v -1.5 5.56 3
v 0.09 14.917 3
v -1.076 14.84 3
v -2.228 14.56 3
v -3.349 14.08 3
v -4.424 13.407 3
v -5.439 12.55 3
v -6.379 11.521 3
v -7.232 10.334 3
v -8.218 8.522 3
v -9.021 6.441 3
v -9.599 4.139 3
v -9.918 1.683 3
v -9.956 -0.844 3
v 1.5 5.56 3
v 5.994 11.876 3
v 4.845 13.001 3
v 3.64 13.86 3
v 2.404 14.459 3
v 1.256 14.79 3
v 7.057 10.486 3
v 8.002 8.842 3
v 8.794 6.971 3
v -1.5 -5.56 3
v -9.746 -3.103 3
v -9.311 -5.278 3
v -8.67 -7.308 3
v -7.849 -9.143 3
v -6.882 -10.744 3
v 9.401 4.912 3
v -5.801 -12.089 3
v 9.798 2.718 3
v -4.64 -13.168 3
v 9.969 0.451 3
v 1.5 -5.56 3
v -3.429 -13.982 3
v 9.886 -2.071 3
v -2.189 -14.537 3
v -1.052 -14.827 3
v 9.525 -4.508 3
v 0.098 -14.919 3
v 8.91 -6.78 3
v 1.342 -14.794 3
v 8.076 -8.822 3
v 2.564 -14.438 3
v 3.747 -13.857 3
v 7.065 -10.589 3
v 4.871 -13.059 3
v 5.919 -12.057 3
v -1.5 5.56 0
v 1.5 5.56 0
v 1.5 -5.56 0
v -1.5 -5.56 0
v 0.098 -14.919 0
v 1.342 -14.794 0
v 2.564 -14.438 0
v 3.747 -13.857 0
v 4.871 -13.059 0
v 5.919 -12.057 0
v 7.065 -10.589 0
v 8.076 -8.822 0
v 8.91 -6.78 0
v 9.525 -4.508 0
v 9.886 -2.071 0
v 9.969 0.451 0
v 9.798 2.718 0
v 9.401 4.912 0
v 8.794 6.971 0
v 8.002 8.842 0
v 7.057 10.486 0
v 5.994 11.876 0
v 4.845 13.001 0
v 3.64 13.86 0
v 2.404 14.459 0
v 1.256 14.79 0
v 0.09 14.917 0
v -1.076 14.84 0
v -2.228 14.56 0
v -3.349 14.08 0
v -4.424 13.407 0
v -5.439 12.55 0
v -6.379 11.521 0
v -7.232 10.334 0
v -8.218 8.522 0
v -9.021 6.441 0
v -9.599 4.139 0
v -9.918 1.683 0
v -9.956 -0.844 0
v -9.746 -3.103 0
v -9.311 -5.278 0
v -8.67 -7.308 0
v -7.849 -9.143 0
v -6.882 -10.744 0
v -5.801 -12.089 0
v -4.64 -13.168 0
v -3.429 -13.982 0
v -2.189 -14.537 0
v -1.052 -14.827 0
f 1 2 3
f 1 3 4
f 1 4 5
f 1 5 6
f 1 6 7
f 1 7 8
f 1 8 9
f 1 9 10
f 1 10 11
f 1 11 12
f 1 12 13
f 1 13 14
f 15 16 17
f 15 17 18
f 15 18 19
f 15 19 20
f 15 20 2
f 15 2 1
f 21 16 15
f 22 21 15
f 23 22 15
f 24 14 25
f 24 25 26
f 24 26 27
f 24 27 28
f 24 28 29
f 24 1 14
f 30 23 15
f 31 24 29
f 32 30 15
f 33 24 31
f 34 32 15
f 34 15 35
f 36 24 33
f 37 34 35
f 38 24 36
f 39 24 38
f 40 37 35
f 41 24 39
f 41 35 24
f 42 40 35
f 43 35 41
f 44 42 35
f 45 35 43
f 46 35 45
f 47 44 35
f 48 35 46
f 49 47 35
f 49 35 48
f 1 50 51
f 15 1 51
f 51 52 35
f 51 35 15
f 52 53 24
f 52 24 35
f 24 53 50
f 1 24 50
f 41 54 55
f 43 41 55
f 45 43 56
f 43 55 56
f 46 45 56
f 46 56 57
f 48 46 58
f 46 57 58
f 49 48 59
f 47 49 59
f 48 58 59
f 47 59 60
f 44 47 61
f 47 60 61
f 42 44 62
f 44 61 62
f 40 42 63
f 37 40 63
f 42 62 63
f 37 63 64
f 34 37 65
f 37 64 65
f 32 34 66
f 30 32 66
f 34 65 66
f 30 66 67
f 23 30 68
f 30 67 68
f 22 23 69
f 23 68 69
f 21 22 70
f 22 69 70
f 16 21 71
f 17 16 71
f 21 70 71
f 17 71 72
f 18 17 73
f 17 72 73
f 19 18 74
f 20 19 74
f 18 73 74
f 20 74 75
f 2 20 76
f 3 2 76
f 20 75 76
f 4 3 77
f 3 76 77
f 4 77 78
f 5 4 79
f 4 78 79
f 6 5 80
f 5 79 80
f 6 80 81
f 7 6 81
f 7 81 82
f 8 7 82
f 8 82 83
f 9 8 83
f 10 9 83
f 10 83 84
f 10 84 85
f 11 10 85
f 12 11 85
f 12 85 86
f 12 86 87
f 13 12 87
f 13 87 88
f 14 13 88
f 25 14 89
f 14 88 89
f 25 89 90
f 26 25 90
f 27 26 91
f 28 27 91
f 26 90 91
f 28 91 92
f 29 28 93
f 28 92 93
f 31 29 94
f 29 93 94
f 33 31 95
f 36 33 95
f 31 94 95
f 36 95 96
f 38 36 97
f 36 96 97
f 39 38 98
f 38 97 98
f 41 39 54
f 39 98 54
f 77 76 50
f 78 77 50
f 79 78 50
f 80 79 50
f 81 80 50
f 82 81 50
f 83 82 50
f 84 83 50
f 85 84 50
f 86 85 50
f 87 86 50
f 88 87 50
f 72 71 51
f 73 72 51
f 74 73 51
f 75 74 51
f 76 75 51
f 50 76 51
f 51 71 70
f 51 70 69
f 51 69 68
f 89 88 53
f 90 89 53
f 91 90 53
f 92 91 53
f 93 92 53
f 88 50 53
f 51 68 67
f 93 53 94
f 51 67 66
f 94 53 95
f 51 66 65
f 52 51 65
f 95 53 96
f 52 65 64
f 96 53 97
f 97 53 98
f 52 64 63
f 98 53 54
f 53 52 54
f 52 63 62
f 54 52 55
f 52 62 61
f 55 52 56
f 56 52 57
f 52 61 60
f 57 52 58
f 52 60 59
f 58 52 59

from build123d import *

# Parameters (mm, degrees)
SKETCH1_RX         = 14.919059527
SKETCH1_RY         = 9.974940077
SKETCH1_W          = 3
SKETCH1_H          = 11.12
BASE_EXTRUDE_DEPTH = 3


with BuildPart() as part:
    # Sketch1 → Base-Extrude (new body)
    with BuildSketch(Plane.XY):
        with Locations(Location((0, 0), (0, 0, -89.623387163))):
            Ellipse(SKETCH1_RX, SKETCH1_RY)
        Rectangle(SKETCH1_W, SKETCH1_H, mode=Mode.SUBTRACT)
    extrude(amount=BASE_EXTRUDE_DEPTH)


solid = part.part
